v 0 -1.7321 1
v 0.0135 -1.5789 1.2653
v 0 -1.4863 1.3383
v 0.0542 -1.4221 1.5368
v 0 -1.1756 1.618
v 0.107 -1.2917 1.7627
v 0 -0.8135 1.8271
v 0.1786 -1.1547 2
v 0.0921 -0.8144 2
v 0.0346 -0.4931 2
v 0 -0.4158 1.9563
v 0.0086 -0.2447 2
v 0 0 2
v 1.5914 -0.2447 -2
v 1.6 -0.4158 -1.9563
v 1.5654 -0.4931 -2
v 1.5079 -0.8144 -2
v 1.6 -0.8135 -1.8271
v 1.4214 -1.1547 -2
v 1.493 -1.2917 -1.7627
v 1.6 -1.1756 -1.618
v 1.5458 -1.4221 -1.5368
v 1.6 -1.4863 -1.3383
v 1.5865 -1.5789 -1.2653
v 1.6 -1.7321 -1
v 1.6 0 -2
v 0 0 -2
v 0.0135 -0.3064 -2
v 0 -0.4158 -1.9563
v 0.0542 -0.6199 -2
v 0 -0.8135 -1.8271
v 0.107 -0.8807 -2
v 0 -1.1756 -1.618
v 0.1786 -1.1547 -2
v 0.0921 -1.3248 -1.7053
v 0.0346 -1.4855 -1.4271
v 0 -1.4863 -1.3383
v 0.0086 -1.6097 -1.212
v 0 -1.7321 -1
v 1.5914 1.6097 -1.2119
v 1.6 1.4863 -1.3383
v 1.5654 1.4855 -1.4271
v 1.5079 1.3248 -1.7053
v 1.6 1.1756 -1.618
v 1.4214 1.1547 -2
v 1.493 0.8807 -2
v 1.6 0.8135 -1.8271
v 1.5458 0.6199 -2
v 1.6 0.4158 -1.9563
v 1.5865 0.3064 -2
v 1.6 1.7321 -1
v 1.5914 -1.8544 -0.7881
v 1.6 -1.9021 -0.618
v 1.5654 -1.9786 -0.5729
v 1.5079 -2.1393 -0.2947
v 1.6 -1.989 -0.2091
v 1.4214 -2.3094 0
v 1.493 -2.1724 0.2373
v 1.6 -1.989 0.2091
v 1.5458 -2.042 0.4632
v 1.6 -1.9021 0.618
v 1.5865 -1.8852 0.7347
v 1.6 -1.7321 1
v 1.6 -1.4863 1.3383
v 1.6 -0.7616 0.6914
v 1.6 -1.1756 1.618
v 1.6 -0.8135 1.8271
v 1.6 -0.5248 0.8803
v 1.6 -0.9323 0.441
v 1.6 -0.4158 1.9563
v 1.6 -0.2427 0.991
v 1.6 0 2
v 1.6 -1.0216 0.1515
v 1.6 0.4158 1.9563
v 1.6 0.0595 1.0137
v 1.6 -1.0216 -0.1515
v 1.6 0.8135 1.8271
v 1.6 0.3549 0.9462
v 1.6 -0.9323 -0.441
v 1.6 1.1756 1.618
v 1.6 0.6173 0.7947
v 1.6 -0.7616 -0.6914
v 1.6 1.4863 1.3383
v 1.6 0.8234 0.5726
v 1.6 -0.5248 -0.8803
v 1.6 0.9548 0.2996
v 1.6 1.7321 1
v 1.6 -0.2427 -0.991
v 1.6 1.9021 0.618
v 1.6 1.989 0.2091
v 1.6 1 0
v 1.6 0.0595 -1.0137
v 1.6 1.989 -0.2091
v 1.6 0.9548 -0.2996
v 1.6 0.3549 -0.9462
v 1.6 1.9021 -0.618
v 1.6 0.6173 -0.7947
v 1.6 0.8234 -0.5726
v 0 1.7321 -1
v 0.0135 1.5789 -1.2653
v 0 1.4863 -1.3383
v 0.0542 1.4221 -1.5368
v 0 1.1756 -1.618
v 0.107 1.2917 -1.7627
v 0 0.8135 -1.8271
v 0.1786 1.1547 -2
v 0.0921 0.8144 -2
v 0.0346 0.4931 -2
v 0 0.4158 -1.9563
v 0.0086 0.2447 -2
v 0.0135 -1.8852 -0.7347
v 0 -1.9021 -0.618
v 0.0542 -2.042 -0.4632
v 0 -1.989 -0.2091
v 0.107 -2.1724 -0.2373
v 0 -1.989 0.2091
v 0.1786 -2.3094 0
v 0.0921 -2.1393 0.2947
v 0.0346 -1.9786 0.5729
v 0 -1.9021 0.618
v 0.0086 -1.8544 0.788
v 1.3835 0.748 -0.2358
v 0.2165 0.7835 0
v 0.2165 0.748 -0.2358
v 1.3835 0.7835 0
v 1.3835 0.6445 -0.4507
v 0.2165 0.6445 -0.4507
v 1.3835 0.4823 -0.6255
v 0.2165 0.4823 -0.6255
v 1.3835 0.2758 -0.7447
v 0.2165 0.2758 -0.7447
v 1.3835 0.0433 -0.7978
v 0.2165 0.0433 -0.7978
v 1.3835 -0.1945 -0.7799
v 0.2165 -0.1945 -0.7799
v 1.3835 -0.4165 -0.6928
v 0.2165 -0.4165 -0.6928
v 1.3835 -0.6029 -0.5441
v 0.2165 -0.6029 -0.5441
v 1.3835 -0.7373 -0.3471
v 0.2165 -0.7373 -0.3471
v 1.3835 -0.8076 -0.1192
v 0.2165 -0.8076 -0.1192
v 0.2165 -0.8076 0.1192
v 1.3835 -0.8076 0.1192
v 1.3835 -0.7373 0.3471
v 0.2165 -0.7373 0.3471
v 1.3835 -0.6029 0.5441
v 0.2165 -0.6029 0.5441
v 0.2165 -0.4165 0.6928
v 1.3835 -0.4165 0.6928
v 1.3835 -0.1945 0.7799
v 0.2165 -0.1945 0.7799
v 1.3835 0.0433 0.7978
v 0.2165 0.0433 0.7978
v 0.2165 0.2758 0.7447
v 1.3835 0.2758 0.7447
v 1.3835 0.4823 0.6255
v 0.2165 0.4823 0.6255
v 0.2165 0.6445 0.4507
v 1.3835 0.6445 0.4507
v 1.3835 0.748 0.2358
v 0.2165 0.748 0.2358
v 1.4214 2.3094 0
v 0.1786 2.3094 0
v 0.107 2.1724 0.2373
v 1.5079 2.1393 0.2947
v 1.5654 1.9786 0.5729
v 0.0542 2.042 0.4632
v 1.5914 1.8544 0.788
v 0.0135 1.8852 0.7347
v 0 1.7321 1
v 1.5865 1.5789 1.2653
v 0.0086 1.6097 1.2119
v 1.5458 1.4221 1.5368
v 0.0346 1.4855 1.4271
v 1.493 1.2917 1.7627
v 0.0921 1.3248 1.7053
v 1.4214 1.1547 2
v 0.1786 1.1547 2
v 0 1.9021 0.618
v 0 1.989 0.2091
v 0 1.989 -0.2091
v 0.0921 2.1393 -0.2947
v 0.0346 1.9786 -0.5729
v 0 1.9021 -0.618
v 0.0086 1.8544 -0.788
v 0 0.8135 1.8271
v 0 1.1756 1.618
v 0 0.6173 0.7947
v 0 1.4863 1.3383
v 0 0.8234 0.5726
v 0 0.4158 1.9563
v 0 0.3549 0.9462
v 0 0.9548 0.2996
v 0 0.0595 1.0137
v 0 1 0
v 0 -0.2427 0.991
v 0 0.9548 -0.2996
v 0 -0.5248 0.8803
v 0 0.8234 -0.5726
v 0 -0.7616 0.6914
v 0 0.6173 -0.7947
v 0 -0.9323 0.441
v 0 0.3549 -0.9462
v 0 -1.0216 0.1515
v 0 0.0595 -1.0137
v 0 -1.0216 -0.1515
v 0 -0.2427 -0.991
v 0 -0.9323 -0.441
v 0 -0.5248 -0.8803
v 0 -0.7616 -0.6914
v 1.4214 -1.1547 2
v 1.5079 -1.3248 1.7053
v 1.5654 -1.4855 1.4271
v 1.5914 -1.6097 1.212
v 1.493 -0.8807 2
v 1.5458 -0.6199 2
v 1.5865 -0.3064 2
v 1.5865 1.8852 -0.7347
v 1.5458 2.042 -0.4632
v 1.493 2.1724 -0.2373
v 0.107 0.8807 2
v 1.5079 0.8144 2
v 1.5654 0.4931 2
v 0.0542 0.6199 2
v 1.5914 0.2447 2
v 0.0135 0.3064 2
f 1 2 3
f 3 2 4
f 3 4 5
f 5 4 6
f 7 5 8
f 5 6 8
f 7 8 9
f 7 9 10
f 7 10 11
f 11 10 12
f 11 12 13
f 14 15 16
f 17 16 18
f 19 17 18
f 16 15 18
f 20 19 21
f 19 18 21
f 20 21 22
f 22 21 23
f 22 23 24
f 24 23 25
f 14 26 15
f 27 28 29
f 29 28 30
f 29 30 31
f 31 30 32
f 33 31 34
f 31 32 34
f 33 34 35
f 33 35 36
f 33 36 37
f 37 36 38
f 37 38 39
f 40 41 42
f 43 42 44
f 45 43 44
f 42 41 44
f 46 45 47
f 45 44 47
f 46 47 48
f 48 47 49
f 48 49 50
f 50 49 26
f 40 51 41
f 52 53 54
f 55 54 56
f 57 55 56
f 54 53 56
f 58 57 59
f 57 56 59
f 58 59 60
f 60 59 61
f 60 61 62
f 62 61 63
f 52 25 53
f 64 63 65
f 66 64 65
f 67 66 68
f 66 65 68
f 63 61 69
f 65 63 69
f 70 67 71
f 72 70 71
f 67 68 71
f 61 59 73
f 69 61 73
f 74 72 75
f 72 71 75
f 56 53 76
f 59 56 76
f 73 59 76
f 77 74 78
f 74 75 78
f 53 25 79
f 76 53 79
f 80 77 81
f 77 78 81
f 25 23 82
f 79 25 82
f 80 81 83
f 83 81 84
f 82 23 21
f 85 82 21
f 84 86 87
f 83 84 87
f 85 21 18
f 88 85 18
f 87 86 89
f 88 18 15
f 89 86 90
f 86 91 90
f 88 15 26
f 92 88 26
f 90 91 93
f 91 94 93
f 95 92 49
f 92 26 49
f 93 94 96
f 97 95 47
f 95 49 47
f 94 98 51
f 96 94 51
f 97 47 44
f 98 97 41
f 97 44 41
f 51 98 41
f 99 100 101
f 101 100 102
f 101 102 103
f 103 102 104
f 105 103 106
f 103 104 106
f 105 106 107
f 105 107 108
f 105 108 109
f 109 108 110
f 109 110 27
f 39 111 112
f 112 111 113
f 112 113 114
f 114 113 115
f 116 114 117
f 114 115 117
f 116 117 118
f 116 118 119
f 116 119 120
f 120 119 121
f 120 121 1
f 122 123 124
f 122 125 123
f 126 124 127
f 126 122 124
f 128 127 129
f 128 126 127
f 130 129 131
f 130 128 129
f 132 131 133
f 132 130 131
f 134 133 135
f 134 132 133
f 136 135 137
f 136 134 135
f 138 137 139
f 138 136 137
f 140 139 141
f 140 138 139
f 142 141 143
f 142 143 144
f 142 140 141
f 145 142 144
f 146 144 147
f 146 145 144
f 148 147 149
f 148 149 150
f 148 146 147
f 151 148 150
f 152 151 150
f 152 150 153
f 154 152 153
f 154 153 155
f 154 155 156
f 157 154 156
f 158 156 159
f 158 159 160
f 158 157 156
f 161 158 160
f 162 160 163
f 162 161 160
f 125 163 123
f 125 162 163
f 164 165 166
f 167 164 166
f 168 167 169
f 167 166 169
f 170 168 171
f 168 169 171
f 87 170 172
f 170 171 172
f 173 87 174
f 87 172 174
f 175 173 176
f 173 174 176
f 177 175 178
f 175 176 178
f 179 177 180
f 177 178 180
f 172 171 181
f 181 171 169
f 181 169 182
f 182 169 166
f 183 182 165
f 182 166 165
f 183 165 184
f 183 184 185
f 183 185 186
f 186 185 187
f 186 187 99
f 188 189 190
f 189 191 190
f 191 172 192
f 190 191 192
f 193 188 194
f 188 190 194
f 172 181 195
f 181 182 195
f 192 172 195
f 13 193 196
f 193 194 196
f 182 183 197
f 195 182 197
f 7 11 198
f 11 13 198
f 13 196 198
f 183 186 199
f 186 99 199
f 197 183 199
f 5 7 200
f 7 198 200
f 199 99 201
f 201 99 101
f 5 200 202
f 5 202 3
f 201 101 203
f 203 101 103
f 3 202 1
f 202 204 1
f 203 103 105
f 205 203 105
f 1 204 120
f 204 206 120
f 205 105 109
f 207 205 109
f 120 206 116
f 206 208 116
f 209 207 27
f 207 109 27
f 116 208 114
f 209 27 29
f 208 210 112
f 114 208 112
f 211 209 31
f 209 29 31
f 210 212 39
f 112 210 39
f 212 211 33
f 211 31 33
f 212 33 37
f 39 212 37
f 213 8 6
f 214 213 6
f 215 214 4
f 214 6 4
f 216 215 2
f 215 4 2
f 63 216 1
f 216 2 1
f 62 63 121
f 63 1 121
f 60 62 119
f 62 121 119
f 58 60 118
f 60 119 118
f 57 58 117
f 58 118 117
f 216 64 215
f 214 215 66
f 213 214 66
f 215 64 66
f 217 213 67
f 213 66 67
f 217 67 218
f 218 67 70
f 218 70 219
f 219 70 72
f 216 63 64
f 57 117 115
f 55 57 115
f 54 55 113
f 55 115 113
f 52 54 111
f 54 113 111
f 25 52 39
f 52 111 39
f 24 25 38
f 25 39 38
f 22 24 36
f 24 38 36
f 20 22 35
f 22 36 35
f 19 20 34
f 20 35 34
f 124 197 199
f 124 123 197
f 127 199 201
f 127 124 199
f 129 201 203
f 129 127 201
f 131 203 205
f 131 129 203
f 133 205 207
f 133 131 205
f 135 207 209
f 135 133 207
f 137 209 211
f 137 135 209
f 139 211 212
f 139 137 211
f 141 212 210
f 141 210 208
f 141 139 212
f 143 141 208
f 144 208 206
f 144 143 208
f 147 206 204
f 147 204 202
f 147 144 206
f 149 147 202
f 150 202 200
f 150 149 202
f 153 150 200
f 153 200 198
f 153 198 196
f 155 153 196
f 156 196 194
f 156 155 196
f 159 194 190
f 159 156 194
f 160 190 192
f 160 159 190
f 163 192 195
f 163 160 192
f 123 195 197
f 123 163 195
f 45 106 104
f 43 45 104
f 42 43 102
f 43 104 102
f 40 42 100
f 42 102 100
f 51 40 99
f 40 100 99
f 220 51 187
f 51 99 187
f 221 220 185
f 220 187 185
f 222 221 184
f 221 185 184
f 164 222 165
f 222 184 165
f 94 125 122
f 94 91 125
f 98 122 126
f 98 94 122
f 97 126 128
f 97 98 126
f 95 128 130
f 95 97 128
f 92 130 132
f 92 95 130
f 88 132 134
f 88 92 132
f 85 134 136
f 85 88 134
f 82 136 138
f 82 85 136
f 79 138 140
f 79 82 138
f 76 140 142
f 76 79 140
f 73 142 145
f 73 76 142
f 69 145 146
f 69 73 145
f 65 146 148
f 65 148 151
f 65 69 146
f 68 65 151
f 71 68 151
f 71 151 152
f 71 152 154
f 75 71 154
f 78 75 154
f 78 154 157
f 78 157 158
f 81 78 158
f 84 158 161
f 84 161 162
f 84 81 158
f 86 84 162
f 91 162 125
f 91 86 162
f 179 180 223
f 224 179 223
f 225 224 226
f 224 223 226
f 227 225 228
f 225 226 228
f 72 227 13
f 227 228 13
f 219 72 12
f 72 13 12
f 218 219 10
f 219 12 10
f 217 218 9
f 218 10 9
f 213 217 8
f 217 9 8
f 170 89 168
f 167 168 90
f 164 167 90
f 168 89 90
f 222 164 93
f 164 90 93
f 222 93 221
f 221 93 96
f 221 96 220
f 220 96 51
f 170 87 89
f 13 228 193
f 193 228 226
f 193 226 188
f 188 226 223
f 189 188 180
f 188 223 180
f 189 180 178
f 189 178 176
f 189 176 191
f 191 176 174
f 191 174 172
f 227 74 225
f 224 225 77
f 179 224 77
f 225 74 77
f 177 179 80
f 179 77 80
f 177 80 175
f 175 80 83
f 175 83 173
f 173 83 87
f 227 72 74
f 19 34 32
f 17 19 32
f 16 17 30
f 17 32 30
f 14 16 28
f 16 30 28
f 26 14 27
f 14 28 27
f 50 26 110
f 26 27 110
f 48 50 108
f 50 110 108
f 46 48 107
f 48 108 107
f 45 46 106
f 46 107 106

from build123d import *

# Parameters (mm, degrees)
SKETCH2_W          = 6
SKETCH2_H          = 6
CUT_EXTRUDE1_DEPTH = 1.6


with BuildPart() as part:
    # Sketch1 → Revolve1 (revolve)
    with BuildSketch(Plane.XY):
        Polygon((0, 0), (0, 2), (0.230940108, 2.4), (1.369059892, 2.4), (1.6, 2), (1.6, 0), align=None)
    revolve(axis=Axis((1.6, 0, 0), (-1, 0, 0)))

    # Sketch2 → Cut-Extrude1 (cut)
    with BuildSketch(Plane(origin=(0, 0, 0), x_dir=(0, 0, -1), z_dir=(1, 0, 0))):
        Rectangle(SKETCH2_W, SKETCH2_H)
        Polygon((-2, -1.154700538), (0, -2.309401077), (2, -1.154700538), (2, 1.154700538), (0, 2.309401077), (-2, 1.154700538), align=None, mode=Mode.SUBTRACT)
    extrude(amount=CUT_EXTRUDE1_DEPTH, mode=Mode.SUBTRACT)

    # Sketch3 → Cut-Revolve1 (revolve, cut)
    with BuildSketch(Plane.XY):
        Polygon((0, -0.0165), (0, 1), (0.2165, 0.7835), (1.3835, 0.7835), (1.6, 1), (1.6, -0.0165), align=None)
    revolve(axis=Axis((1.6, -0.0165, 0), (-1, 0, 0)), mode=Mode.SUBTRACT)


solid = part.part
